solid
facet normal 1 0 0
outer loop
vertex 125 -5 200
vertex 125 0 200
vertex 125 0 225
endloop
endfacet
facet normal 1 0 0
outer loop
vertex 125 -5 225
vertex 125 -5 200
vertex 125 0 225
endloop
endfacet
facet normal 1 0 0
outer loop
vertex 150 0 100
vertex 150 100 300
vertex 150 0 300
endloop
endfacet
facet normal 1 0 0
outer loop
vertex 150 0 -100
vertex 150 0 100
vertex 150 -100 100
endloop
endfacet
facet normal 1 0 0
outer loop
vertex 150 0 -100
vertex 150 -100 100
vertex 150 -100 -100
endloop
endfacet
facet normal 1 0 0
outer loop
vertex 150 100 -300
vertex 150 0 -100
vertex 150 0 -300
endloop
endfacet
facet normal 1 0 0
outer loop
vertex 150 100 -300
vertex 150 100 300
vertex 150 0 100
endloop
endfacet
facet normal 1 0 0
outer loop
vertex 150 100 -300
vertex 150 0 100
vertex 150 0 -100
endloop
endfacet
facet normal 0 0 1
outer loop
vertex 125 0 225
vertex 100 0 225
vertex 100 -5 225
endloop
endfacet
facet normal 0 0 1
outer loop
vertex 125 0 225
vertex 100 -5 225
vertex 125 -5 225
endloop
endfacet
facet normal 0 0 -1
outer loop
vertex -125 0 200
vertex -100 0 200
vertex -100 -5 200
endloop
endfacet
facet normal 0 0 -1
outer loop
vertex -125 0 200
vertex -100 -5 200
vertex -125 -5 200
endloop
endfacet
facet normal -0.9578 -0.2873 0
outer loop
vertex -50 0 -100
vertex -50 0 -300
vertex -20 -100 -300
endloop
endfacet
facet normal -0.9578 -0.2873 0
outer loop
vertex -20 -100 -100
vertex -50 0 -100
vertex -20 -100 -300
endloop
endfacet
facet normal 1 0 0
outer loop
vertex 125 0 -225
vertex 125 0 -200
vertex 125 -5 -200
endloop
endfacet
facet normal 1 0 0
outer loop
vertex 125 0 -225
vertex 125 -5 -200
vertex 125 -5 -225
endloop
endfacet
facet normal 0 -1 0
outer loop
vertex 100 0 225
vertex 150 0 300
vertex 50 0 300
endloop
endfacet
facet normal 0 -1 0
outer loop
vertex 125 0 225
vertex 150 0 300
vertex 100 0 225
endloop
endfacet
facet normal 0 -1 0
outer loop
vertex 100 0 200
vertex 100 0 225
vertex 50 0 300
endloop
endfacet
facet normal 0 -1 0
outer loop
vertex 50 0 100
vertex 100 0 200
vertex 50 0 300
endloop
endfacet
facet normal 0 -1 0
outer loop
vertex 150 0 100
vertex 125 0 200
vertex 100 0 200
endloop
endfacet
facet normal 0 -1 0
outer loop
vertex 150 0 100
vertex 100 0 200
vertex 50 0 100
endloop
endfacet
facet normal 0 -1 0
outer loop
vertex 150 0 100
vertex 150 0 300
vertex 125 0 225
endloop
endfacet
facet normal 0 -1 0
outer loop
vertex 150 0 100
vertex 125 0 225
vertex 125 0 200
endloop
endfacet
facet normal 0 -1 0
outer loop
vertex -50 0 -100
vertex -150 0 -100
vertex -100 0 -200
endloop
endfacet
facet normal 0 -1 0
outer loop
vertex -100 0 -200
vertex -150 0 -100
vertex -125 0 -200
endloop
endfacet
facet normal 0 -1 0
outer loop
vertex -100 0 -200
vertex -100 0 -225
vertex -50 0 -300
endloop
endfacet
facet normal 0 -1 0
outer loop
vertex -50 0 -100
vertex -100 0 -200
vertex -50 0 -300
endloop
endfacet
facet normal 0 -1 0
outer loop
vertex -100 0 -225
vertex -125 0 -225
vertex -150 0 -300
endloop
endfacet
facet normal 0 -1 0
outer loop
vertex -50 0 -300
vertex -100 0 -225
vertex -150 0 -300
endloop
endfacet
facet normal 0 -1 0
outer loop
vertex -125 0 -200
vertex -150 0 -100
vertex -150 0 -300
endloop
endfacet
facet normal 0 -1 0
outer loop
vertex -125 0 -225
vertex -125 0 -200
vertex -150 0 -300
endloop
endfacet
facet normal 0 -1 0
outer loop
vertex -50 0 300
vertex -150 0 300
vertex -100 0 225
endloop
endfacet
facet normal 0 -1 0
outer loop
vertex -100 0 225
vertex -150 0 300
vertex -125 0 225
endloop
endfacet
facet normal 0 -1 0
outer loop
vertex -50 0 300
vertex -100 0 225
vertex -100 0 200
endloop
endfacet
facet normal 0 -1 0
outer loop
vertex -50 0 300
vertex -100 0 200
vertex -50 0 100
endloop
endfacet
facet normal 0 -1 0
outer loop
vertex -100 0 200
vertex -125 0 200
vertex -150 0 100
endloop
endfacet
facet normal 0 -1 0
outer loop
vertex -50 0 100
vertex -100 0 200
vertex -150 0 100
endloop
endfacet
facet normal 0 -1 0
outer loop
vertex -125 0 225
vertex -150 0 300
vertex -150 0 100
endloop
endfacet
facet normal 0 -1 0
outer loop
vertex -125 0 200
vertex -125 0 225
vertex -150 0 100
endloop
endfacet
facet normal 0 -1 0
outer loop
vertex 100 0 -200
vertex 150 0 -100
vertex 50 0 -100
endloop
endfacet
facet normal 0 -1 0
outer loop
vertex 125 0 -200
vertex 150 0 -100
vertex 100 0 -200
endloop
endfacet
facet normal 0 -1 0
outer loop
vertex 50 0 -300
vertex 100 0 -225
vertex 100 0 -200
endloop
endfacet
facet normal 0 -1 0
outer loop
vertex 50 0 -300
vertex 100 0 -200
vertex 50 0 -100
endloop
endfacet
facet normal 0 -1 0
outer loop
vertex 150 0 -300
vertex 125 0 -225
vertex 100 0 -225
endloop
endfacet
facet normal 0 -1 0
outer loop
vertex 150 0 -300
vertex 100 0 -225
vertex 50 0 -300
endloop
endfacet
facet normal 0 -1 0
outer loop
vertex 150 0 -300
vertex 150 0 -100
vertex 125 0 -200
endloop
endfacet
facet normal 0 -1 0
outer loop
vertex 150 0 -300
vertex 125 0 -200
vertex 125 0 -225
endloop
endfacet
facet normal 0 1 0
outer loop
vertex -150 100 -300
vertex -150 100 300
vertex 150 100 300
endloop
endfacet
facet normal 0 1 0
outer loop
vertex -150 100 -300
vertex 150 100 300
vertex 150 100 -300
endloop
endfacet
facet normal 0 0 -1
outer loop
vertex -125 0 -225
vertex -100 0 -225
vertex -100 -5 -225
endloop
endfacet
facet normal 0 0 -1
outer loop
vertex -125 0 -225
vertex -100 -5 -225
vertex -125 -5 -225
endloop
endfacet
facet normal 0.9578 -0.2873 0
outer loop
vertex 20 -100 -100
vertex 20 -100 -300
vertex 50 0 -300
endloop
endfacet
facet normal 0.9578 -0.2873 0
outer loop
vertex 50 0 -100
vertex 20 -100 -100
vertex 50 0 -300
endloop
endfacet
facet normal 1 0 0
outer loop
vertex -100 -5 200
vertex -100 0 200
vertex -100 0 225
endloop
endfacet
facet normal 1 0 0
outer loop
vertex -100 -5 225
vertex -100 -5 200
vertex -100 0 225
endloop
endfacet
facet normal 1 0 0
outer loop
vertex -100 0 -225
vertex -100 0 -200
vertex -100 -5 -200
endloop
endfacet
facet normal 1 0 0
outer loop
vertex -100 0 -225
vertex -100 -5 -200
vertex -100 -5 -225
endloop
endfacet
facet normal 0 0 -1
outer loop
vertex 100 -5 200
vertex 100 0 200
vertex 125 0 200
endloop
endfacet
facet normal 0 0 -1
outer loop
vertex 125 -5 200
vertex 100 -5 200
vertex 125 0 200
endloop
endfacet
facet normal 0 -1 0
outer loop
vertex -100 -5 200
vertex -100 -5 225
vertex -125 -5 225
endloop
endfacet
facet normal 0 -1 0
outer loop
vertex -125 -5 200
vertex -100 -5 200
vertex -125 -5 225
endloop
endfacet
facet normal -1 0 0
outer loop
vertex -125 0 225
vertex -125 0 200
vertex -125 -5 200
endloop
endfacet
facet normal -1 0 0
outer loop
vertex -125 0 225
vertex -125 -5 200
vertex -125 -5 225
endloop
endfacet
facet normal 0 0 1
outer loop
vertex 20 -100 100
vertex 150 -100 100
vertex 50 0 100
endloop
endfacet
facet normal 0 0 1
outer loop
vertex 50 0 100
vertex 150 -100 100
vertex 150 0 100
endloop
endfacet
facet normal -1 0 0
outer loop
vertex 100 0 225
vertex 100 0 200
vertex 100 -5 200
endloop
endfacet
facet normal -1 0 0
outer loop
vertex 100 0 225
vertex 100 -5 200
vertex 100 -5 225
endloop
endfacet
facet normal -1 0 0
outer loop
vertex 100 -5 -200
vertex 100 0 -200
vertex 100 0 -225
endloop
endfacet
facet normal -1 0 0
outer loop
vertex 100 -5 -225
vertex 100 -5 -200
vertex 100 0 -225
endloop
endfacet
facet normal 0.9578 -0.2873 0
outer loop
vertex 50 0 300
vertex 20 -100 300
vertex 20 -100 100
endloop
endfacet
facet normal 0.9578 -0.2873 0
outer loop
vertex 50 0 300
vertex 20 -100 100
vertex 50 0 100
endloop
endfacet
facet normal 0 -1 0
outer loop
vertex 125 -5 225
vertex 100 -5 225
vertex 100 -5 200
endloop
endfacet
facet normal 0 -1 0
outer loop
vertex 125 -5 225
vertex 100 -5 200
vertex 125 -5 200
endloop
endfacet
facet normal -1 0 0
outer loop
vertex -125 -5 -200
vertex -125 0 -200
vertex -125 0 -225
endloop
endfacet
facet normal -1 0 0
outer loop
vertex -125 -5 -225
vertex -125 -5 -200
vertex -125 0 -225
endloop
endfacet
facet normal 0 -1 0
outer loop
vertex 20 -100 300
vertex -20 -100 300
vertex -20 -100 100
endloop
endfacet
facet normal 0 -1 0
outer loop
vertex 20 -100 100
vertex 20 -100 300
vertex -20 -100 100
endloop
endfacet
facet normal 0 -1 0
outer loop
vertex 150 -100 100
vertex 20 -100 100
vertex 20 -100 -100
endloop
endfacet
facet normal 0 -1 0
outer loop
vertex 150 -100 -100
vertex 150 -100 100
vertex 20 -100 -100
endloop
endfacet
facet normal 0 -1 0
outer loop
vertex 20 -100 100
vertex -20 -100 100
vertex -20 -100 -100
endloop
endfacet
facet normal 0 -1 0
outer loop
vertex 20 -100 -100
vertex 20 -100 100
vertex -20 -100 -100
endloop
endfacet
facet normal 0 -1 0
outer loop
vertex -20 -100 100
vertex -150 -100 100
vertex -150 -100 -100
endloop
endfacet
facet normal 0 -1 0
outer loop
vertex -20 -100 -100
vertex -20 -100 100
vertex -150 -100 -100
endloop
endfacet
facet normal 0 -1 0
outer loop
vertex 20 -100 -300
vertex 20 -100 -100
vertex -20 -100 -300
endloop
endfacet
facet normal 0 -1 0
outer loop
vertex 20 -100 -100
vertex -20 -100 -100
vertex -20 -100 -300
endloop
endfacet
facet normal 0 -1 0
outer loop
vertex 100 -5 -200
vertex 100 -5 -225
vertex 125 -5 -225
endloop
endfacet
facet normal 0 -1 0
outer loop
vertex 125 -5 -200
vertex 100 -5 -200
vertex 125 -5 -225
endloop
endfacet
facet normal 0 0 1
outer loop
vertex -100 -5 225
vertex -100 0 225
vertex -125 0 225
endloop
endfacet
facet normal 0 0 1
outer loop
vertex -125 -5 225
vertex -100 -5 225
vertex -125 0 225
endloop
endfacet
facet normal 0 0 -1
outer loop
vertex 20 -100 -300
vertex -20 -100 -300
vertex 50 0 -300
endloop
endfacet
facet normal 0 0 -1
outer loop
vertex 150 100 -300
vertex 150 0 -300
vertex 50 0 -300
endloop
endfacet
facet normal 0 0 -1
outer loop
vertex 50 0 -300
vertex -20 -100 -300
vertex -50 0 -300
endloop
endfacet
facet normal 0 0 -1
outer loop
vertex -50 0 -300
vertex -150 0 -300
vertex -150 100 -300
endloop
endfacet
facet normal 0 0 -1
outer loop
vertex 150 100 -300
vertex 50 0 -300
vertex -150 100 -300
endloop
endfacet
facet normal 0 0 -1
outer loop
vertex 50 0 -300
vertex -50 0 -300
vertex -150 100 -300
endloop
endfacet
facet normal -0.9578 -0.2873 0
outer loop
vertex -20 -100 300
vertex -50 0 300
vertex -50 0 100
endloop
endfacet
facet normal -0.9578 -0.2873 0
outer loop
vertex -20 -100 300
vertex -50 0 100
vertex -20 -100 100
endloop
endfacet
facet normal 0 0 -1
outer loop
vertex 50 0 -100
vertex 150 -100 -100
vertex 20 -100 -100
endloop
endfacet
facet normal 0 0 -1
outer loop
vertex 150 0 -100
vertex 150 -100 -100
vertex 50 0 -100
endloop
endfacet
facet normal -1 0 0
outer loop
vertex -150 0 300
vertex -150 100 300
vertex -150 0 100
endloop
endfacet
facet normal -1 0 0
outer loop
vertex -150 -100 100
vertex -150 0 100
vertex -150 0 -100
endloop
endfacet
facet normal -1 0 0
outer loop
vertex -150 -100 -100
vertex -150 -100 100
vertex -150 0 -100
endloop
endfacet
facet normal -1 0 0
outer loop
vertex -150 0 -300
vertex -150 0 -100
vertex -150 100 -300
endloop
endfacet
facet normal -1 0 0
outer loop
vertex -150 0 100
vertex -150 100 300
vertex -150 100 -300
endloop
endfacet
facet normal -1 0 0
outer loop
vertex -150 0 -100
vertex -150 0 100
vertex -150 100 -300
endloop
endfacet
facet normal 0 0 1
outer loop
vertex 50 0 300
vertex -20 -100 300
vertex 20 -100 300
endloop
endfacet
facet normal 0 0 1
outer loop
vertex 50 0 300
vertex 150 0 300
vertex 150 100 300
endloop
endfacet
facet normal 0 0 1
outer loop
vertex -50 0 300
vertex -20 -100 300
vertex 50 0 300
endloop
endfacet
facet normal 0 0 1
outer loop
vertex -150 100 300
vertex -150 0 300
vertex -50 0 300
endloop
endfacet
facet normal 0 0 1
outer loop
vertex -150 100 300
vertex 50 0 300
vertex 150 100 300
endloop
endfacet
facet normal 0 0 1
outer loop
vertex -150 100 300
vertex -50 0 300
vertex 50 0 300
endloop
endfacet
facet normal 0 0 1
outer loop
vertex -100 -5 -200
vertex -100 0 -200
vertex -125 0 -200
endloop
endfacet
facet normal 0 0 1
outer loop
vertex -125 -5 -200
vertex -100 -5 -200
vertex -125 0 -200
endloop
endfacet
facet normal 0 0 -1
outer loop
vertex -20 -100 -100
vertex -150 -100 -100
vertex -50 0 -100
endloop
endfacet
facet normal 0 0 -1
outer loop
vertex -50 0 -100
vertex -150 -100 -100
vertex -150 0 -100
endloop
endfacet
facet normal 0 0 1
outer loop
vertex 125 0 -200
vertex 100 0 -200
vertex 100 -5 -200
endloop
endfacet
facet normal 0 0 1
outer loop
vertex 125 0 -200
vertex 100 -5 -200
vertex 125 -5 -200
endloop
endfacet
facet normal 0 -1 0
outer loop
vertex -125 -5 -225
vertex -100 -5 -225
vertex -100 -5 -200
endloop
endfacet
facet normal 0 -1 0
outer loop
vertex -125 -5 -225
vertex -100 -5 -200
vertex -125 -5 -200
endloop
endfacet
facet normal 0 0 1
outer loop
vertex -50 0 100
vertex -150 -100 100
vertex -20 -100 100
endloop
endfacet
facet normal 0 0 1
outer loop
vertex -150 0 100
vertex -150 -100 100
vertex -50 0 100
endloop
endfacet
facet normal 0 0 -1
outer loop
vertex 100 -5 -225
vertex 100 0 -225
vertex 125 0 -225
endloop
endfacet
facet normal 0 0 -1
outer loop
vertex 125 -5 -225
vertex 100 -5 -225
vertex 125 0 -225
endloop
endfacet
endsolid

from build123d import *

# Parameters (mm, degrees)
BOSS_EXTRUDE1_DEPTH      = 150
BOSS_EXTRUDE1_DEPTH_BACK = 150
SKETCH2_W                = 600
SKETCH2_H                = 200
SKETCH3_W                = 200
SKETCH3_H                = 100
CUT_EXTRUDE1_DEPTH       = 100
SKETCH4_W                = 25
SKETCH4_H                = 25
BOSS_EXTRUDE2_DEPTH      = 5
MIRROR3_COPY_1_SKETCH_W  = 25
MIRROR3_COPY_1_SKETCH_H  = 25
MIRROR3_COPY_1_DEPTH     = 5
MIRROR3_COPY_2_SKETCH_W  = 25
MIRROR3_COPY_2_SKETCH_H  = 25
MIRROR3_COPY_2_DEPTH     = 5
CUT_EXTRUDE3_DEPTH       = 200


with BuildPart() as part:
    # Sketch2 → Boss-Extrude1 (new, two sides: drawn at the far end of the back side and taken through both)
    with BuildSketch(Plane(origin=(0, 0, 0), x_dir=(0, 0, -1), z_dir=(1, 0, 0)).offset(-BOSS_EXTRUDE1_DEPTH_BACK)):
        Rectangle(SKETCH2_W, SKETCH2_H)
    extrude(amount=BOSS_EXTRUDE1_DEPTH + BOSS_EXTRUDE1_DEPTH_BACK)

    # Sketch3 → Cut-Extrude1 (cut)
    with BuildSketch(Plane(origin=(150, 0, 0), x_dir=(0, 0, -1), z_dir=(1, 0, 0))):
        with Locations((-200, -50)):
            Rectangle(SKETCH3_W, SKETCH3_H)
        with Locations((200, -50)):
            Rectangle(SKETCH3_W, SKETCH3_H)
    cut_extrude1 = extrude(amount=-CUT_EXTRUDE1_DEPTH, mode=Mode.SUBTRACT)

    # Mirror1: Cut-Extrude1 across plane
    add(cut_extrude1.mirror(Plane(origin=(0, 0, 0), x_dir=(0, 0, 1), z_dir=(1, 0, 0))), mode=Mode.SUBTRACT)

    # Sketch4 → Boss-Extrude2 (add)
    with BuildSketch(Plane.XZ):
        with Locations((112.5, 212.5)):
            Rectangle(SKETCH4_W, SKETCH4_H)
    boss_extrude2 = extrude(amount=BOSS_EXTRUDE2_DEPTH)

    # Mirror2: Boss-Extrude2 across plane
    add(boss_extrude2.mirror(Plane(origin=(0, 0, 0), x_dir=(0, 0, 1), z_dir=(1, 0, 0))))

    # Mirror3 copy 1 sketch → Mirror3 copy 1 (add)
    with BuildSketch(Plane(origin=(0, 0, 0), x_dir=(-1, 0, 0), z_dir=(0, -1, 0))):
        with Locations((112.5, 212.5)):
            Rectangle(MIRROR3_COPY_1_SKETCH_W, MIRROR3_COPY_1_SKETCH_H)
    extrude(amount=MIRROR3_COPY_1_DEPTH)

    # Mirror3 copy 2 sketch → Mirror3 copy 2 (add)
    with BuildSketch(Plane.XZ):
        with Locations((112.5, -212.5)):
            Rectangle(MIRROR3_COPY_2_SKETCH_W, MIRROR3_COPY_2_SKETCH_H)
    extrude(amount=MIRROR3_COPY_2_DEPTH)

    # Sketch5 → Cut-Extrude3 (cut)
    with BuildSketch(Plane(origin=(0, 0, -300), x_dir=(-1, 0, 0), z_dir=(0, 0, -1))):
        Polygon((-20, -100), (-50, 0), (-50, -100), align=None)
        Polygon((50, -100), (50, 0), (20, -100), align=None)
    cut_extrude3 = extrude(amount=-CUT_EXTRUDE3_DEPTH, mode=Mode.SUBTRACT)

    # Mirror4: Cut-Extrude3 across plane
    add(cut_extrude3.mirror(Plane.XY), mode=Mode.SUBTRACT)


solid = part.part
